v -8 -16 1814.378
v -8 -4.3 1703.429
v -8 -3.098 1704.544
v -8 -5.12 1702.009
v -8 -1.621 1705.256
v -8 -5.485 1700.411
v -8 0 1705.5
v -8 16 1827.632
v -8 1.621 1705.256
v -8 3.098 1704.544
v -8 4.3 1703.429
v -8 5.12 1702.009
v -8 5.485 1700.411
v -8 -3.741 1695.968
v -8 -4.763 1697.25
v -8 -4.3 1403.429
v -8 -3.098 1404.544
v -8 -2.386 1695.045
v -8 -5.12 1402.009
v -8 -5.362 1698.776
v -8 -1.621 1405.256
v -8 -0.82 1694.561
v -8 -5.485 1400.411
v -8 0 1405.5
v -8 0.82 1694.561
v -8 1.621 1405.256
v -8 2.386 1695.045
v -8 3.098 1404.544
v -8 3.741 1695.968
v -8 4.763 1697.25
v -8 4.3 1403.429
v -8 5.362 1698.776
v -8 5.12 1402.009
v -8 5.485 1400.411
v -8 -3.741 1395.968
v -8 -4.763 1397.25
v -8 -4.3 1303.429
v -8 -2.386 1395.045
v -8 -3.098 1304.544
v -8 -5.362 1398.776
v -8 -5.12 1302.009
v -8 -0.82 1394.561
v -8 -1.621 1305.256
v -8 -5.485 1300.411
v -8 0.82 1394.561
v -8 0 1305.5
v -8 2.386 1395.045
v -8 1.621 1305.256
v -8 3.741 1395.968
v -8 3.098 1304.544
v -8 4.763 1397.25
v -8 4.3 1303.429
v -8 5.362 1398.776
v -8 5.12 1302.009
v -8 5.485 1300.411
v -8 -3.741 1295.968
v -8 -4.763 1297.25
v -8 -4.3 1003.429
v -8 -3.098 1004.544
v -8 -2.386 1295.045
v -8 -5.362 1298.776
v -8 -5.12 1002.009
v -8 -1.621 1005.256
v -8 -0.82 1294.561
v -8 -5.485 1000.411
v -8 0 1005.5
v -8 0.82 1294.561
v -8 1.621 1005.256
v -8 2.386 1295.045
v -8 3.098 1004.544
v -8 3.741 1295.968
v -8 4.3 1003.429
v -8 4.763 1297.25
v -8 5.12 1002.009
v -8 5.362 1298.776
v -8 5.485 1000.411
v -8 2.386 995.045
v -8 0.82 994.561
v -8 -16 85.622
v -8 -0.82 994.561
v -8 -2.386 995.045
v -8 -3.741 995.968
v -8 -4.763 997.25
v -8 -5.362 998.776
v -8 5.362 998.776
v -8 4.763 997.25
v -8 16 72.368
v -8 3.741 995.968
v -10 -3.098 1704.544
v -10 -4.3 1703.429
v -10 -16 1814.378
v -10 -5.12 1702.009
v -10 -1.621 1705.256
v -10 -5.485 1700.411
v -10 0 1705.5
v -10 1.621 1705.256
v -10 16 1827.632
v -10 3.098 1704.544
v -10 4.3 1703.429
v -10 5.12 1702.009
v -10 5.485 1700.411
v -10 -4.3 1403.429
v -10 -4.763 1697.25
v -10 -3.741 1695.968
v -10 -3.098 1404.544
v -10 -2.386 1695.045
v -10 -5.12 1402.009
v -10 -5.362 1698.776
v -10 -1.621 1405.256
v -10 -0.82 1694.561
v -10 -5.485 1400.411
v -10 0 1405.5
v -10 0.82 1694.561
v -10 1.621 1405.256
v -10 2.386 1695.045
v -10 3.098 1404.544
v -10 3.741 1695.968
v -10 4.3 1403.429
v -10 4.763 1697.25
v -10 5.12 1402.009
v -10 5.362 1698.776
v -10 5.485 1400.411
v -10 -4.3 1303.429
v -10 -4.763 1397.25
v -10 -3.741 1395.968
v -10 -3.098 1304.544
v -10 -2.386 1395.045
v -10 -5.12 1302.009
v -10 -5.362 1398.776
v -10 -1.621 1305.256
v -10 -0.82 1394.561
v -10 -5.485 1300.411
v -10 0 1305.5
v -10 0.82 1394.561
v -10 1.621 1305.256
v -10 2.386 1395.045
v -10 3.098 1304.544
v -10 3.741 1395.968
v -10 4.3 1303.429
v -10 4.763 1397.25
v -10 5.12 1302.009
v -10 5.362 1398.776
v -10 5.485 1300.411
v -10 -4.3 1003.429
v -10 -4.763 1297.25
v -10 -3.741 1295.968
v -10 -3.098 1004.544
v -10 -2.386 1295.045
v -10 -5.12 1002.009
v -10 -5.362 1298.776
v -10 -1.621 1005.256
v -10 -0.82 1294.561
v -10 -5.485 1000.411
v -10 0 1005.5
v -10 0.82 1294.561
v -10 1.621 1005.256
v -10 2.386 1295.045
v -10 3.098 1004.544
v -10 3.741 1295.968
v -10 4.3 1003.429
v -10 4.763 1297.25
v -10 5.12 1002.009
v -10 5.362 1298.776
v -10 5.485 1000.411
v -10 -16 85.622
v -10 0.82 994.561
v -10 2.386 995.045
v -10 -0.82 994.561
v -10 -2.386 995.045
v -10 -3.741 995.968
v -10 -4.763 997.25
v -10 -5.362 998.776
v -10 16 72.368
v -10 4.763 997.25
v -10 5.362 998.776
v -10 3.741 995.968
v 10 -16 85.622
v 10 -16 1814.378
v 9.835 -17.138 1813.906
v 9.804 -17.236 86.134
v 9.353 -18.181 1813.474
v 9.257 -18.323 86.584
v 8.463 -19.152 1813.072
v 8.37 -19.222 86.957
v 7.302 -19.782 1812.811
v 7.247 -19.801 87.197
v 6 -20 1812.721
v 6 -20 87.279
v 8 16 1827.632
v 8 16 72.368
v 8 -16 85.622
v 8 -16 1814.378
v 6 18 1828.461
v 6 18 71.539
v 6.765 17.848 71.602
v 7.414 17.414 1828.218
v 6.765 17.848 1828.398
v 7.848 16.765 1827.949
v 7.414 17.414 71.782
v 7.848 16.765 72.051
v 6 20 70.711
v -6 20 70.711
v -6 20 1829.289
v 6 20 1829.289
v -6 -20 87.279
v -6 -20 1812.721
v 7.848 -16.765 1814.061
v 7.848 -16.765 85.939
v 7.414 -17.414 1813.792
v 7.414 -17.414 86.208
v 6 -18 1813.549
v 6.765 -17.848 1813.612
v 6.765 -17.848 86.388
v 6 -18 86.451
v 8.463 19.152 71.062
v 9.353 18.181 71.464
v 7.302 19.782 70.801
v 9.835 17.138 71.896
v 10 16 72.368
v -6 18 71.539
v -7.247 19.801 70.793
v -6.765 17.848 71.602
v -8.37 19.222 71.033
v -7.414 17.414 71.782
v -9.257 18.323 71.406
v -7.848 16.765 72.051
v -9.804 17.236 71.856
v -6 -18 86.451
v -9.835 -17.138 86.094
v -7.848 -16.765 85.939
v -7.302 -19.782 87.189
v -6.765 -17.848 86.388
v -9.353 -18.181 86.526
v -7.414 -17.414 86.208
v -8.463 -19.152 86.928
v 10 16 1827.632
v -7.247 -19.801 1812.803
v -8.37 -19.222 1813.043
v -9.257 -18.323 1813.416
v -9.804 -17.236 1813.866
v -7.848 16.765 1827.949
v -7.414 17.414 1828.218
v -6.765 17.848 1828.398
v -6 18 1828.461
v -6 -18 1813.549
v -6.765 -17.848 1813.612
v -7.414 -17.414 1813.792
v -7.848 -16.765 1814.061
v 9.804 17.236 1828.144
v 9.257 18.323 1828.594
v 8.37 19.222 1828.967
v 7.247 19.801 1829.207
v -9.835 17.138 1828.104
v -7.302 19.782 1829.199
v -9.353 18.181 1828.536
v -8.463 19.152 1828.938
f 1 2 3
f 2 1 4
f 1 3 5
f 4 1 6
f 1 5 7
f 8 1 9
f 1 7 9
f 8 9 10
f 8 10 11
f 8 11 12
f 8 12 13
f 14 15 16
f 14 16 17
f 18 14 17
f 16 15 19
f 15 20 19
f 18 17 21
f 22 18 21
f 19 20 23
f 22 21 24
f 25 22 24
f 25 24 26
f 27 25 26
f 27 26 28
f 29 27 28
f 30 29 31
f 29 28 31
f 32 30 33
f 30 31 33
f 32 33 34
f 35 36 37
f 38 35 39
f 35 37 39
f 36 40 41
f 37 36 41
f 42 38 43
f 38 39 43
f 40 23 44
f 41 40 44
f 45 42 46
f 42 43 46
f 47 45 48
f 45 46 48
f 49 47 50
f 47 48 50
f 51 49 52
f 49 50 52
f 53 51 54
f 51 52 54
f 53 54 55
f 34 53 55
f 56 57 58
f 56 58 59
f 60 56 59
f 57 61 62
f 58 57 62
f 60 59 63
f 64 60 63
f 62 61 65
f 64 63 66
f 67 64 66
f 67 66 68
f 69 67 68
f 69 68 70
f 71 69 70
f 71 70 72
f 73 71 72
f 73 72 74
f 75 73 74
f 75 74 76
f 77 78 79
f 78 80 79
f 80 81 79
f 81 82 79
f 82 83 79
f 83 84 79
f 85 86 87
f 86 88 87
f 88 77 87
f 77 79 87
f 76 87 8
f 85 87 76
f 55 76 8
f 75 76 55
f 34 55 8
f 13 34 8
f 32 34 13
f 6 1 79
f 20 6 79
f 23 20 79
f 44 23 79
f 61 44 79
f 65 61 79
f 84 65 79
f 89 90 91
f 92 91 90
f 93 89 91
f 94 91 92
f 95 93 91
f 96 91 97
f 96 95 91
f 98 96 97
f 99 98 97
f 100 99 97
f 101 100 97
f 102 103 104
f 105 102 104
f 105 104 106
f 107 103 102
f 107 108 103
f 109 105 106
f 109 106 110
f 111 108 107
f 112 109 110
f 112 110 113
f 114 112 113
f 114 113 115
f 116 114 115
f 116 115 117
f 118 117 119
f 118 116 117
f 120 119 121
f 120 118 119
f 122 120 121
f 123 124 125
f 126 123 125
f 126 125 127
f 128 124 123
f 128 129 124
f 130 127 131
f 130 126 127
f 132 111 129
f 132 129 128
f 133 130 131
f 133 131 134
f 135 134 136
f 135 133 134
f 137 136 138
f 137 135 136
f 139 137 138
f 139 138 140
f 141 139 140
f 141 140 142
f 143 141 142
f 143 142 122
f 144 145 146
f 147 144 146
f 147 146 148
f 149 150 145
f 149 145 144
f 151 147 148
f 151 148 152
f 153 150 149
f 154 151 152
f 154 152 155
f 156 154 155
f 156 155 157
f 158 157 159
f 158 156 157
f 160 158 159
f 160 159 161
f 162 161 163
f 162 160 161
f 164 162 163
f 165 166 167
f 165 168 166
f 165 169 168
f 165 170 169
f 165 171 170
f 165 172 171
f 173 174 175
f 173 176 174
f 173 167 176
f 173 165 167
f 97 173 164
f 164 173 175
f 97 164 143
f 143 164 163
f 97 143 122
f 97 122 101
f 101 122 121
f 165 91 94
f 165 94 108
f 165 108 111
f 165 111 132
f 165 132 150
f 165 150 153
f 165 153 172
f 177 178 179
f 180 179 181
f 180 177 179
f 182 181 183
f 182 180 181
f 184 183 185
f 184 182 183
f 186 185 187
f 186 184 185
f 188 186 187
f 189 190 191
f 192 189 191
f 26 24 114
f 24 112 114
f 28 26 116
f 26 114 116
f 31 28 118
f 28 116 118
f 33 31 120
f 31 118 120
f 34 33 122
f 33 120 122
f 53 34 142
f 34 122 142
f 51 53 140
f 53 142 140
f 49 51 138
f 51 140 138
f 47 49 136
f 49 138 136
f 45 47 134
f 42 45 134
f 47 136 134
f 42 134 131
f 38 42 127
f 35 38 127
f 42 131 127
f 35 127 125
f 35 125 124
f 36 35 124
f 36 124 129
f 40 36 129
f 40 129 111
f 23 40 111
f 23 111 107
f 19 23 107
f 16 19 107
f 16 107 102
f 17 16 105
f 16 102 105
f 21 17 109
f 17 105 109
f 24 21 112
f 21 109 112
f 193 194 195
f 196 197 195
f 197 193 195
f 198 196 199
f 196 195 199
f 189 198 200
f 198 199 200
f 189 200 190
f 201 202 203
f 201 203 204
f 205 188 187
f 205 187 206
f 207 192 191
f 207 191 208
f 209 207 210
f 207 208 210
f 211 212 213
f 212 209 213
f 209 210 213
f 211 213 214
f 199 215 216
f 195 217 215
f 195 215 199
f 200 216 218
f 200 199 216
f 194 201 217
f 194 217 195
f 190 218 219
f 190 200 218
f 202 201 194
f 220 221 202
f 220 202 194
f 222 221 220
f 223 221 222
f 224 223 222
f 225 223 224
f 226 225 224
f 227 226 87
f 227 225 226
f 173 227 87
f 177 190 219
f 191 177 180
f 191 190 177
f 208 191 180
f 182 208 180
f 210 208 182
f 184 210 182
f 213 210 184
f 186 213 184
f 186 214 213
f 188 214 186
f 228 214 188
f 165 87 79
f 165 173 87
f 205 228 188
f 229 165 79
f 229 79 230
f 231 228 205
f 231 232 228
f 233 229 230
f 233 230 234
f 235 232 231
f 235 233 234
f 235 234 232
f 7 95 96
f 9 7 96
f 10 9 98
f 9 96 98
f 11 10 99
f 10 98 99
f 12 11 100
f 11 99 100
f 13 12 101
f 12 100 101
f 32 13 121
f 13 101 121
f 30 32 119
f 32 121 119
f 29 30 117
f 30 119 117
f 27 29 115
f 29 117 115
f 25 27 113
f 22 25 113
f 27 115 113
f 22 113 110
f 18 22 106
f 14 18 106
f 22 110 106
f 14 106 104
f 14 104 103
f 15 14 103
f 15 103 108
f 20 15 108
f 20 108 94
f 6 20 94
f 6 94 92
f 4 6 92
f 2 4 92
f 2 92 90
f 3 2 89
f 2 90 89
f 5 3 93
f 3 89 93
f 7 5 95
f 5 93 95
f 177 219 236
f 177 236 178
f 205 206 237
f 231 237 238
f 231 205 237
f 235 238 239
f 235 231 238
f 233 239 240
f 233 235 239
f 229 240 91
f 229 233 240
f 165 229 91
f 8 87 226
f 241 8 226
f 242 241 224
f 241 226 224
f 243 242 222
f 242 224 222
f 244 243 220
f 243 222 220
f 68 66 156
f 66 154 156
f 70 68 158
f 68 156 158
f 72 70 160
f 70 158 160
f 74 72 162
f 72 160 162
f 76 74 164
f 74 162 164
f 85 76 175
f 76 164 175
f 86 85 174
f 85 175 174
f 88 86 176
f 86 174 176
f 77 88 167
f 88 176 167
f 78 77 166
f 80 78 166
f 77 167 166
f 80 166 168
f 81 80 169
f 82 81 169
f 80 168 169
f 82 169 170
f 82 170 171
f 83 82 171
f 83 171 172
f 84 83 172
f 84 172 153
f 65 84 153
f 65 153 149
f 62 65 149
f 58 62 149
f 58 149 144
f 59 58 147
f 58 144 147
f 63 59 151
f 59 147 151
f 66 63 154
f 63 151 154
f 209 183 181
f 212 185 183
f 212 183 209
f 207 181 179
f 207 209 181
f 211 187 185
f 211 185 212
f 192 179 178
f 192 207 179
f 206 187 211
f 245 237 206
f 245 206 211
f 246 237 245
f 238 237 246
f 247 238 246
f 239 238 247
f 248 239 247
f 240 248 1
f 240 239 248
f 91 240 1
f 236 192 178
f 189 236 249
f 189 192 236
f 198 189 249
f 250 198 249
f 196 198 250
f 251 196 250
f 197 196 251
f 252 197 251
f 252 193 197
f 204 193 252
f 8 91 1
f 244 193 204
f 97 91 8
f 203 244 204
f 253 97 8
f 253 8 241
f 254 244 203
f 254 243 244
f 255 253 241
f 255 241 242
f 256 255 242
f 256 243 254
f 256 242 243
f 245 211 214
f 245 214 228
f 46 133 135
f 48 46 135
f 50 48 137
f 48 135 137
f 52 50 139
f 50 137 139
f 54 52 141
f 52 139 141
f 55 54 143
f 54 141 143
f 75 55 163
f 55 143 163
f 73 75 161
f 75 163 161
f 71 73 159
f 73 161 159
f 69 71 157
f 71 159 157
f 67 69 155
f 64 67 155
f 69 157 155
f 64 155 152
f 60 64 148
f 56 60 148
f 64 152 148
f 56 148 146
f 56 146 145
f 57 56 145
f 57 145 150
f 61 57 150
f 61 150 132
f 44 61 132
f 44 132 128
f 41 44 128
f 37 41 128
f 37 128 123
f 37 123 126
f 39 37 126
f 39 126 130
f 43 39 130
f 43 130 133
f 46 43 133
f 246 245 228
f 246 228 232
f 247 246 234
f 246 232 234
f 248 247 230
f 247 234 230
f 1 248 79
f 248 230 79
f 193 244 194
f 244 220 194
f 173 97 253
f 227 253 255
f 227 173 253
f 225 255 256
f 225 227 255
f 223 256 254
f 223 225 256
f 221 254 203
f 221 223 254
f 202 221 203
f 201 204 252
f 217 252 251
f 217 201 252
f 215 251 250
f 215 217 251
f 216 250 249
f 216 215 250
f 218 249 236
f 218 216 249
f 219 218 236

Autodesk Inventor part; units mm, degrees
ref_plane "Start Plane" through (0, 0, 70.7107) normal (0, 0, 1) x (1, 0, 0)
ref_plane "End Plane" through (0, 0, 1829.2893) normal (0, 0, 1) x (1, 0, 0)
sketch "Sketch" plane through (0, 0, 0) normal (0, 0, 1) x (1, 0, 0)
  line L0 (-10, -16) -> (-10, 16)
  line L1 (-6, 20) -> (6, 20)
  line L2 (10, 16) -> (10, -16)
  line L3 (6, -20) -> (-6, -20)
  arc A0 (-10, -16) -> (-6, -20) centre (-6, -16) ccw
  arc A1 (10, 16) -> (6, 20) centre (6, 16) ccw
  arc A2 (-6, 20) -> (-10, 16) centre (-6, 16) ccw
  arc A3 (6, -20) -> (10, -16) centre (6, -16) ccw
  arc A4 (-6, 18) -> (-8, 16) centre (-6, 16) ccw
  line L4 (-6, 18) -> (6, 18)
  arc A5 (8, 16) -> (6, 18) centre (6, 16) ccw
  line L5 (8, 16) -> (8, -16)
  arc A6 (6, -18) -> (8, -16) centre (6, -16) ccw
  line L6 (6, -18) -> (-6, -18)
  arc A7 (-8, -16) -> (-6, -18) centre (-6, -16) ccw
  line L7 (-8, -16) -> (-8, 16)
  line L8 (0, 29.1598) -> (0, -29.1598) construction
  line L9 (-15.1598, 0) -> (15.1598, 0) construction
  dimension "d7" = 4
  dimension "d9" = 20
  dimension "d11" = 40
  dimension "d12" = 2
  dimension "d15" = 10
  dimension "d16" = 20
extrude "Body" add sketch "Sketch" along normal up to surface (1758.5786 mm away) from surface at 70.7107
sketch "Sketch3" plane through (0, 0, 0) normal (0, 0, 1) x (1, 0, 0)
  line L0 (0, 0) -> (10, 0)
ref_plane "Work Plane3" through (0, 0, 0) normal (0, -1, 0) x (1, 0, 0)
ref_plane "Work Plane4" through (0, 20, 1829.2893) normal (0, -0.3827, 0.9239) x (1, 0, 0)
split "Split1" plane through (0, 20, 1829.2893) removes the side toward (0, -0.3827, 0.9239)
ref_plane "Work Plane5" through (0, 20, 70.7107) normal (0, -0.3827, -0.9239) x (1, 0, 0)
split "Split2" plane through (0, 20, 70.7107) removes the side toward (0, -0.3827, -0.9239)
sketch "Sketch5" plane through (-10, 16, 72.3675) normal (-1, 0, 0) x (0, 0, 1)
  line L0 (0, 0) -> (13.2548, -32) construction
  line L1 (13.2548, -32) -> (1742.0101, -32) construction
  line L2 (1742.0101, -32) -> (1755.2649, 0) construction
  line L3 (0, 0) -> (1755.2649, 0) construction
  line L4 (877.6325, -32) -> (877.6325, 0) construction
  line L5 (877.6325, -16) -> (1748.6375, -16) construction
  line L6 (877.6325, -16) -> (6.6274, -16) construction
  circle A0 centre (1227.6325, -16) radius 5.5
  circle A1 centre (927.6325, -16) radius 5.5
  circle A2 centre (1327.6325, -16) radius 5.5
  circle A3 centre (1627.6325, -16) radius 5.5
  point P0 (-72.3675, -16)
  dimension "d19" = 11
  dimension "d20" = 300
  dimension "d21" = 50
  dimension "d22" = 300
  dimension "d23" = 100
extrude "Extrusion2" cut sketch "Sketch5" against normal up to surface (2 mm away)
sketch "Sketch4" plane through (0, 0, 0) normal (0, -1, 0) x (1, 0, 0)
  line L0 (-2, 70.7107) -> (12, 70.7107) projected
  line L1 (-2, 1829.2893) -> (12, 1829.2893) projected
  dimension "d18" = 1758.5786
equation "\"d7\" = G_IR"
equation "\"d9\" = G_W"
equation "\"d11\" = G_H"
equation "\"d12\" = G_T"
equation "\"d15\" = 0.5 * d9"
equation "\"d16\" = 0.5 * d11"
equation "\"d3\" = G_L"
equation "\"d22\" = d20"
equation "\"G_W\" = 20"
equation "\"G_H\" = 40"
equation "\"G_T\" = 2"
equation "\"G_IR\" = 4"
equation "\"G_L\" = d18"
equation "\"G_OFFSET_START\" = -70.71068"
equation "\"G_OFFSET_END\" = -70.71068"
equation "\"d13\" = -G_OFFSET_START"
equation "\"d14\" = G_OFFSET_END + B_L"
equation "\"B_L\" = 1900"
properties part number "ISO 4019 - 40x20x2 - 1758,58" material "Steel, Mild"
